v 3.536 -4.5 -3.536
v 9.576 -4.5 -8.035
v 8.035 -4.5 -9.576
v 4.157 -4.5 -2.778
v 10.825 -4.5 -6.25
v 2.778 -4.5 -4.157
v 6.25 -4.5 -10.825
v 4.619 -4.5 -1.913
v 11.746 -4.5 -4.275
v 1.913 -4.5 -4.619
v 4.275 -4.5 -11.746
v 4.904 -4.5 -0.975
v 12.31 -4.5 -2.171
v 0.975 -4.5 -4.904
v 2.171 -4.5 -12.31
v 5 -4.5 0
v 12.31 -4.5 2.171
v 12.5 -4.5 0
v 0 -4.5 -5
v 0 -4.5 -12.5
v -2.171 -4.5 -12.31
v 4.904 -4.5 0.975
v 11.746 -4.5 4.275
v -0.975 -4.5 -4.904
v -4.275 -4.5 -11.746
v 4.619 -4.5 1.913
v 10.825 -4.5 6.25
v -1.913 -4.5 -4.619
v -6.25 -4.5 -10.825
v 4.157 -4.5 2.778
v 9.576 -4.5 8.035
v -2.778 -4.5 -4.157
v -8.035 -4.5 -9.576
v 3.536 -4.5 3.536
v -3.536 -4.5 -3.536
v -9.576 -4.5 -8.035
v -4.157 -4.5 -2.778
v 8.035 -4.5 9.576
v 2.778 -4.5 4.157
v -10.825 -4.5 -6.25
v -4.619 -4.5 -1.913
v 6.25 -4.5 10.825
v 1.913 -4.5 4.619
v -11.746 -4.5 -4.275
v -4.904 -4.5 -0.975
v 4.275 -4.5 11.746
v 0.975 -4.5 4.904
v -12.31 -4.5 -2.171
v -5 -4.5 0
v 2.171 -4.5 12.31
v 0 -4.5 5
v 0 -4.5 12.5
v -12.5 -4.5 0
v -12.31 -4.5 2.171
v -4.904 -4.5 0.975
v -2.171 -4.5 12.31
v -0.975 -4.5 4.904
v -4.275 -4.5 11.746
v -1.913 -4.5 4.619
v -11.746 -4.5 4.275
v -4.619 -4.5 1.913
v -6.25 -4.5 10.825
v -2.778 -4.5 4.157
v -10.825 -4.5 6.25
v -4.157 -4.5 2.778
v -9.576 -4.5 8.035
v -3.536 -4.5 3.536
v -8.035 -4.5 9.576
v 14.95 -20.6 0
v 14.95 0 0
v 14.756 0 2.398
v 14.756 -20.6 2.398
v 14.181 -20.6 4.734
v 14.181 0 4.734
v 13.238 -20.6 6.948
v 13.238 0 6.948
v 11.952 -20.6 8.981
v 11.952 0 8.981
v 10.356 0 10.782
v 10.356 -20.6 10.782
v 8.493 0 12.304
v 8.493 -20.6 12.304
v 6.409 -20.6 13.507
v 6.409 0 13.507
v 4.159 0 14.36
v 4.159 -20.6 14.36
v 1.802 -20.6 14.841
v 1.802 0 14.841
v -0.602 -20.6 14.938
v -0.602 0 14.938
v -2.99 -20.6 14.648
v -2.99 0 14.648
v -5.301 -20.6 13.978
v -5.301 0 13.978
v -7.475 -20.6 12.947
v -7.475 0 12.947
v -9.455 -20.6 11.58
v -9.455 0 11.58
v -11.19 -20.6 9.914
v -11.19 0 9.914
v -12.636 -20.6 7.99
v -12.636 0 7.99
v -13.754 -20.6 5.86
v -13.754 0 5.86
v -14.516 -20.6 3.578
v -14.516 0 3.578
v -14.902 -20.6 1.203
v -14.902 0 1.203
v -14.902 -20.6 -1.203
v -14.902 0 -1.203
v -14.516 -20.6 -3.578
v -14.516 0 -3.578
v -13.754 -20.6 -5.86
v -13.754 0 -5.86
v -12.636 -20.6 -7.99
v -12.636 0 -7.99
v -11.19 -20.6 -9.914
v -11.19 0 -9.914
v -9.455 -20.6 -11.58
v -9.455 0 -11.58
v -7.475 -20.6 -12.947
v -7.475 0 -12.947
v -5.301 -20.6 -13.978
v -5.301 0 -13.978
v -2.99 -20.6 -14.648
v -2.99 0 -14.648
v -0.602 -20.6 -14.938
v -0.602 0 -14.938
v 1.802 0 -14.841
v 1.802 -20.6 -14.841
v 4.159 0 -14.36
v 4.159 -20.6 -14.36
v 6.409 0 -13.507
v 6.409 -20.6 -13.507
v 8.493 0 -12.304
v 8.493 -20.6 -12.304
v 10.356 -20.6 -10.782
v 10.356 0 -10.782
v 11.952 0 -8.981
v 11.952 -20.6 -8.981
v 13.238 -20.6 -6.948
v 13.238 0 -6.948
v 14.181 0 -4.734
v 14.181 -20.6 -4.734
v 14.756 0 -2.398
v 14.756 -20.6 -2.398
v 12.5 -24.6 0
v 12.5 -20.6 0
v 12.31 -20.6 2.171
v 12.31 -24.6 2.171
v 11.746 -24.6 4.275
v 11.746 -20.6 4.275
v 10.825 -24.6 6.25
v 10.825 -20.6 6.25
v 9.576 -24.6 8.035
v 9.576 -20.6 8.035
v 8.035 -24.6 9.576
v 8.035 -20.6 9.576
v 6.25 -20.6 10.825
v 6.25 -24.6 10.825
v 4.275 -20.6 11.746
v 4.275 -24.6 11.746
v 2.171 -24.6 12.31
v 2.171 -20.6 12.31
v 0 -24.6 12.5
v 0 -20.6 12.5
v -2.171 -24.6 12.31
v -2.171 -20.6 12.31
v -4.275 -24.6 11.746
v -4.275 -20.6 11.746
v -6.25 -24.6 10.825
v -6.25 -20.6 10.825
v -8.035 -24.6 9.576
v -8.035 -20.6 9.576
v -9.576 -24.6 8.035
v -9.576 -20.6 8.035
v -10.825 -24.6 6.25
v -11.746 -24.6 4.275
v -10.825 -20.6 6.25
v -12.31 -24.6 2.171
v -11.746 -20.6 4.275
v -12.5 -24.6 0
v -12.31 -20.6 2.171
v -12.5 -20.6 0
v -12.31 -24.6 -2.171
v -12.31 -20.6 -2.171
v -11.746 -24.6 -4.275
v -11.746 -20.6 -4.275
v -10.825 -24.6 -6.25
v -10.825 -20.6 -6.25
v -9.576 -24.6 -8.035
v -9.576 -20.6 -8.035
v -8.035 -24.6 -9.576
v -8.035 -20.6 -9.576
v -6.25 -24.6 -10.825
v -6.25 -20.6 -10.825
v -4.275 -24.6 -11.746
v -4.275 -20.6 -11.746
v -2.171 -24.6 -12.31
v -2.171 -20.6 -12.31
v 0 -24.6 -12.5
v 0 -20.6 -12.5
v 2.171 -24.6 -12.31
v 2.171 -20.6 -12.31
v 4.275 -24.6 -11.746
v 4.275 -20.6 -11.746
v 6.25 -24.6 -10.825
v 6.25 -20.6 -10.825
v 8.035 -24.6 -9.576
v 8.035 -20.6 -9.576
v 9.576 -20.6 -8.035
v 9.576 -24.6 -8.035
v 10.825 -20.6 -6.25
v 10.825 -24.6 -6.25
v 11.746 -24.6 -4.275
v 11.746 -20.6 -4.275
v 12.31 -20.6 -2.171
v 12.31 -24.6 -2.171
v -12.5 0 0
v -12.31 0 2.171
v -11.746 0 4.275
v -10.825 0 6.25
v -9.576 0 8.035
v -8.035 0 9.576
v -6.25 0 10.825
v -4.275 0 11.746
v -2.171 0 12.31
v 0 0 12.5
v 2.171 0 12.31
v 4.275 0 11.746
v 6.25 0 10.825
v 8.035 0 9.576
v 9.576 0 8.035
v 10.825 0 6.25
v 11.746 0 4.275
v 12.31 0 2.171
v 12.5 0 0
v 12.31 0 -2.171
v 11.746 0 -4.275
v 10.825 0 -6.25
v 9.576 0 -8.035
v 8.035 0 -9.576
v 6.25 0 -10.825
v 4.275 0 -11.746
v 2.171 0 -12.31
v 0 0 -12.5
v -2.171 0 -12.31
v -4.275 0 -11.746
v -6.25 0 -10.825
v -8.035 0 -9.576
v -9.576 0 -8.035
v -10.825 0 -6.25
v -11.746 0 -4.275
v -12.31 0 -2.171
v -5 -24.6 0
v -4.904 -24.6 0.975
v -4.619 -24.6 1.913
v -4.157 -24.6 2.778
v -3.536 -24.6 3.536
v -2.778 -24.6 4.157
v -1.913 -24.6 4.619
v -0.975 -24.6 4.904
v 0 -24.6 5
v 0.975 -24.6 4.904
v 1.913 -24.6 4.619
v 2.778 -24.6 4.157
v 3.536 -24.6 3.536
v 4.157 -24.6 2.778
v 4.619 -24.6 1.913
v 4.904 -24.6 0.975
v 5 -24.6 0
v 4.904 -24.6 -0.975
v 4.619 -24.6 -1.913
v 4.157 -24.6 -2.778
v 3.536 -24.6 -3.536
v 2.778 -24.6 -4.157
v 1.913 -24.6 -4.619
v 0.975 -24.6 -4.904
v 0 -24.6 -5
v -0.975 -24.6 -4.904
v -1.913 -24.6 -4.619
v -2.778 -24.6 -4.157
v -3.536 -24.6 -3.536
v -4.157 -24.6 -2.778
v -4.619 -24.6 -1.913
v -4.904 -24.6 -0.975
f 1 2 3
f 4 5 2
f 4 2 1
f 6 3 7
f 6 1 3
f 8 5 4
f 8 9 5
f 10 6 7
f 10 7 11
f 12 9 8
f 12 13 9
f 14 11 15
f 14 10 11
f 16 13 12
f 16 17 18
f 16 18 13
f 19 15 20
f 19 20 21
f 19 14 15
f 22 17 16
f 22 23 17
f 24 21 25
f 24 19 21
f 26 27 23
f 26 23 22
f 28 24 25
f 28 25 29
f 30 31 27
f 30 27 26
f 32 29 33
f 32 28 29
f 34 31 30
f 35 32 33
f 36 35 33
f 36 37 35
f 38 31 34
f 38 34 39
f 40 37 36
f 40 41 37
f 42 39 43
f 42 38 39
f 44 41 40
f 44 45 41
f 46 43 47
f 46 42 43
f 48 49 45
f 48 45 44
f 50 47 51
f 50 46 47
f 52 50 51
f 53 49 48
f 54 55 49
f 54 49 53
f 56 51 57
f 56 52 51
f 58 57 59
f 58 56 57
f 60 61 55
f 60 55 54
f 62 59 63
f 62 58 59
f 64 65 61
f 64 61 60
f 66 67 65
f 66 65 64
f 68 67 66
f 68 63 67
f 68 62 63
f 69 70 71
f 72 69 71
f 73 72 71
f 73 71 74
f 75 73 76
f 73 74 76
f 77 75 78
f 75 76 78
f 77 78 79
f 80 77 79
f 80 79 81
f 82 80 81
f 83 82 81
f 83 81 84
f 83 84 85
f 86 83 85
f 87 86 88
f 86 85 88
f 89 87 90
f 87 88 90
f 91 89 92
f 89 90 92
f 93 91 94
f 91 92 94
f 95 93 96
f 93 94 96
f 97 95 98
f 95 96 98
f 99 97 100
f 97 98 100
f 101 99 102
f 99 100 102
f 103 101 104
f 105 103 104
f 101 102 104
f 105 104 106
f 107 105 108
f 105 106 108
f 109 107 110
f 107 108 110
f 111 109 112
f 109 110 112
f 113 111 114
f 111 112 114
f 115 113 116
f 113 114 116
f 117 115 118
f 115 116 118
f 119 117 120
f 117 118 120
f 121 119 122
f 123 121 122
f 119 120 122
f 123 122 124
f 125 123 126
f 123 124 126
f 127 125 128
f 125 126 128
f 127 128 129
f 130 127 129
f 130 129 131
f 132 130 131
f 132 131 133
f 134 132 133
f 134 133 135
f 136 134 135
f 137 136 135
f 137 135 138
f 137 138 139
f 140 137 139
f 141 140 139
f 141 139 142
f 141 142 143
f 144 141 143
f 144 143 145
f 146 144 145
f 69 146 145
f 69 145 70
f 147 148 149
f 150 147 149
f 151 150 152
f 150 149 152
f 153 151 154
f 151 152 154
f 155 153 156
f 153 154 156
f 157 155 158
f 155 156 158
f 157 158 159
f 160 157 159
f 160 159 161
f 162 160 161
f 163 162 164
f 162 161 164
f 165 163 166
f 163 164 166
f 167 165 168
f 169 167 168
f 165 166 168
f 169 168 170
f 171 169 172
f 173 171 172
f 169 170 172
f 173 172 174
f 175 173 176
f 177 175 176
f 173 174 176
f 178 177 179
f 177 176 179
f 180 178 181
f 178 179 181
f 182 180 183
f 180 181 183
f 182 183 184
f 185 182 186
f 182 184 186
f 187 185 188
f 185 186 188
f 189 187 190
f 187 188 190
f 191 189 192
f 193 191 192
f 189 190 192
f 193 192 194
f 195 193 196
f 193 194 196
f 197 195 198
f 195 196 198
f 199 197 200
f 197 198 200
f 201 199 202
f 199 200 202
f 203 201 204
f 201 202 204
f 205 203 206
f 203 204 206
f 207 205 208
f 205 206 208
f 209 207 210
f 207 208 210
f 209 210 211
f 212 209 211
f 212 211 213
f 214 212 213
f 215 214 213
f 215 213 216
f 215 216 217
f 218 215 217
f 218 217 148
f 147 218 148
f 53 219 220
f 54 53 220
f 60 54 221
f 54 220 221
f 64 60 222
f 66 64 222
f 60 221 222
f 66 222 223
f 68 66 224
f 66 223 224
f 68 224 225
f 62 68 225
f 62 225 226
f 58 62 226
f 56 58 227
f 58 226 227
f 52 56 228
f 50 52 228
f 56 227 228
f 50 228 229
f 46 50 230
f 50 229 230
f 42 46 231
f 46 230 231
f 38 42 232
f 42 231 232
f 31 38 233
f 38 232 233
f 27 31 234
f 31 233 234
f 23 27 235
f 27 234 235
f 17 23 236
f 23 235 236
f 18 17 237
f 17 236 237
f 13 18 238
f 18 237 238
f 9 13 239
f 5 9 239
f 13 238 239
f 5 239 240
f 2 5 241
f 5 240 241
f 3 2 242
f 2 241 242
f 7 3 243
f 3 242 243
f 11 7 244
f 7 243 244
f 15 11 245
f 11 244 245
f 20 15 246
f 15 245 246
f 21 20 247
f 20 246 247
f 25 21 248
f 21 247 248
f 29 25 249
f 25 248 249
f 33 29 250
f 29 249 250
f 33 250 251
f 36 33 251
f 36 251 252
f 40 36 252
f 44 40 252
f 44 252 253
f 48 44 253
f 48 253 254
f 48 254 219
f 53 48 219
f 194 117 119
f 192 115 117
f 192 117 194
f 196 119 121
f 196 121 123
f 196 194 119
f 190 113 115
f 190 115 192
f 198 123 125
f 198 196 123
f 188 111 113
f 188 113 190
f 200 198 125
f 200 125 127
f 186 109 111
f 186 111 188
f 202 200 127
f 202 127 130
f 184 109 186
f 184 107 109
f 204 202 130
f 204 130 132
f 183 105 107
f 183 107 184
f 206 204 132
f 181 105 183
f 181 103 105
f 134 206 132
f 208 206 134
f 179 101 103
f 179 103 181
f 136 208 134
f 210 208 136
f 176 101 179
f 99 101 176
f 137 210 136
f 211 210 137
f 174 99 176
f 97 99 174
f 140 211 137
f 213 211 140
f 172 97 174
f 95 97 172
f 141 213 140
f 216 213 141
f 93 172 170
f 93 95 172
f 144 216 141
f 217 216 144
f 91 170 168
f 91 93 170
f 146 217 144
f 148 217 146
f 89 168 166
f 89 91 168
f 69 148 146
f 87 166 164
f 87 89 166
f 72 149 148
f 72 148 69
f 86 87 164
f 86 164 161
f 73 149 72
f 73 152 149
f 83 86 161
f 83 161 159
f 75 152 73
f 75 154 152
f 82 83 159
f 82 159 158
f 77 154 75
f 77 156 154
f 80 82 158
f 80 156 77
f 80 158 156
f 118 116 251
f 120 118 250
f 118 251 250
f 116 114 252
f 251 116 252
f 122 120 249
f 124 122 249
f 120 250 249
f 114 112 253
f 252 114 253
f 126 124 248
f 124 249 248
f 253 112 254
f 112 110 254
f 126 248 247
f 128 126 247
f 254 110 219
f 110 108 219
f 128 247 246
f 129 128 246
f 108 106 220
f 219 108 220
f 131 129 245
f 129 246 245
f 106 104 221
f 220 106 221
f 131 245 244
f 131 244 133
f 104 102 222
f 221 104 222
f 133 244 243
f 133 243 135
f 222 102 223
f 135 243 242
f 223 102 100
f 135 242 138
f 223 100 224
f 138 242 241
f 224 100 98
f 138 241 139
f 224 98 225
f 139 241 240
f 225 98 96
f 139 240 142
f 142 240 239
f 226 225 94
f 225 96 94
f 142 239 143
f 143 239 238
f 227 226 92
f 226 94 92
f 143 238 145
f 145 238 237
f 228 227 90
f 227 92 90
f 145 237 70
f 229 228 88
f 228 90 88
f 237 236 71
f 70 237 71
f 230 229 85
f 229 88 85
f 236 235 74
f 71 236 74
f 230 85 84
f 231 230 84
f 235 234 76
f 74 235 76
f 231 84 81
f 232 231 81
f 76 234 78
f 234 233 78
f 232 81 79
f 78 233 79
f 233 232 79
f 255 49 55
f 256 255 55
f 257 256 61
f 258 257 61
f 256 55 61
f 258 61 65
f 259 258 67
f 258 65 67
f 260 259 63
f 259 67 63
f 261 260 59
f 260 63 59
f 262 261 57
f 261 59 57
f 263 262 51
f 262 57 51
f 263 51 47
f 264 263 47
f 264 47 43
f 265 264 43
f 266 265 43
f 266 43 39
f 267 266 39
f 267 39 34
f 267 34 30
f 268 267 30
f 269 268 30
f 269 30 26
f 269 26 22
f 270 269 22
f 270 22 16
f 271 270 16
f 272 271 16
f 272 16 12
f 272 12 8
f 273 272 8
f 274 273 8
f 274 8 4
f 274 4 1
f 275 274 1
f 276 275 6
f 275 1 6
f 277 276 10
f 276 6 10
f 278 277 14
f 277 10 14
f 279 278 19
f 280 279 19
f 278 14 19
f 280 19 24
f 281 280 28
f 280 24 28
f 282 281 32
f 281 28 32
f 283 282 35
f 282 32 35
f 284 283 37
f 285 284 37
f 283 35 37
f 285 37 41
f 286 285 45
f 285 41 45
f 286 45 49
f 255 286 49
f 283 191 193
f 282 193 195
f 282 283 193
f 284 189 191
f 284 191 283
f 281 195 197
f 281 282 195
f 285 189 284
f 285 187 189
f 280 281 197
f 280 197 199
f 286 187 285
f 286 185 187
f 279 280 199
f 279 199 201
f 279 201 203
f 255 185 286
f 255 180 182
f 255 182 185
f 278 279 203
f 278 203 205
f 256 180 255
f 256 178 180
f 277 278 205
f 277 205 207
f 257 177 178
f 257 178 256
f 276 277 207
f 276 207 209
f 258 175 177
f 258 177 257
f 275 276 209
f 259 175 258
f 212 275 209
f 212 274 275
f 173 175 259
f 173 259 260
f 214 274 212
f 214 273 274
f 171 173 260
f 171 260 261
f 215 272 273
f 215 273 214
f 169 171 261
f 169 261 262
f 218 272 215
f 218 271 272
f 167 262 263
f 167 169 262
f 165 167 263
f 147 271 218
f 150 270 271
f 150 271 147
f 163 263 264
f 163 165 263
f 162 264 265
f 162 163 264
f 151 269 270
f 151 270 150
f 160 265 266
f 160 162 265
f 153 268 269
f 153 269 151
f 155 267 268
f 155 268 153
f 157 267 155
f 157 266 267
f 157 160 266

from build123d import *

# Parameters (mm, degrees)
F0_R     = 14.95
F1_DEPTH = 20.6
F2_R     = 12.5
F3_DEPTH = 4
F4_R     = 12.5
F5_DEPTH = 4.5
F6_R     = 5
F7_DEPTH = 25


with BuildPart() as f1:
    # F0 (on Front) → F1 (new body)
    with BuildSketch(Plane.XZ):
        Circle(F0_R)
    extrude(amount=F1_DEPTH)

    # F2 (on face) → F3 (join)
    with BuildSketch(Plane.XZ.offset(20.6)):
        Circle(F2_R)
    extrude(amount=F3_DEPTH)

    # F4 (on face) → F5 (cut)
    with BuildSketch(Plane(origin=(0, 0, 0), x_dir=(-1, 0, 0), z_dir=(0, 1, 0))):
        Circle(F4_R)
    extrude(amount=-F5_DEPTH, mode=Mode.SUBTRACT)

    # F6 (on face) → F7 (cut)
    with BuildSketch(Plane(origin=(0, -4.5, 0), x_dir=(-1, 0, 0), z_dir=(0, 1, 0))):
        Circle(F6_R)
    extrude(amount=-F7_DEPTH, mode=Mode.SUBTRACT)


solid = f1.part
